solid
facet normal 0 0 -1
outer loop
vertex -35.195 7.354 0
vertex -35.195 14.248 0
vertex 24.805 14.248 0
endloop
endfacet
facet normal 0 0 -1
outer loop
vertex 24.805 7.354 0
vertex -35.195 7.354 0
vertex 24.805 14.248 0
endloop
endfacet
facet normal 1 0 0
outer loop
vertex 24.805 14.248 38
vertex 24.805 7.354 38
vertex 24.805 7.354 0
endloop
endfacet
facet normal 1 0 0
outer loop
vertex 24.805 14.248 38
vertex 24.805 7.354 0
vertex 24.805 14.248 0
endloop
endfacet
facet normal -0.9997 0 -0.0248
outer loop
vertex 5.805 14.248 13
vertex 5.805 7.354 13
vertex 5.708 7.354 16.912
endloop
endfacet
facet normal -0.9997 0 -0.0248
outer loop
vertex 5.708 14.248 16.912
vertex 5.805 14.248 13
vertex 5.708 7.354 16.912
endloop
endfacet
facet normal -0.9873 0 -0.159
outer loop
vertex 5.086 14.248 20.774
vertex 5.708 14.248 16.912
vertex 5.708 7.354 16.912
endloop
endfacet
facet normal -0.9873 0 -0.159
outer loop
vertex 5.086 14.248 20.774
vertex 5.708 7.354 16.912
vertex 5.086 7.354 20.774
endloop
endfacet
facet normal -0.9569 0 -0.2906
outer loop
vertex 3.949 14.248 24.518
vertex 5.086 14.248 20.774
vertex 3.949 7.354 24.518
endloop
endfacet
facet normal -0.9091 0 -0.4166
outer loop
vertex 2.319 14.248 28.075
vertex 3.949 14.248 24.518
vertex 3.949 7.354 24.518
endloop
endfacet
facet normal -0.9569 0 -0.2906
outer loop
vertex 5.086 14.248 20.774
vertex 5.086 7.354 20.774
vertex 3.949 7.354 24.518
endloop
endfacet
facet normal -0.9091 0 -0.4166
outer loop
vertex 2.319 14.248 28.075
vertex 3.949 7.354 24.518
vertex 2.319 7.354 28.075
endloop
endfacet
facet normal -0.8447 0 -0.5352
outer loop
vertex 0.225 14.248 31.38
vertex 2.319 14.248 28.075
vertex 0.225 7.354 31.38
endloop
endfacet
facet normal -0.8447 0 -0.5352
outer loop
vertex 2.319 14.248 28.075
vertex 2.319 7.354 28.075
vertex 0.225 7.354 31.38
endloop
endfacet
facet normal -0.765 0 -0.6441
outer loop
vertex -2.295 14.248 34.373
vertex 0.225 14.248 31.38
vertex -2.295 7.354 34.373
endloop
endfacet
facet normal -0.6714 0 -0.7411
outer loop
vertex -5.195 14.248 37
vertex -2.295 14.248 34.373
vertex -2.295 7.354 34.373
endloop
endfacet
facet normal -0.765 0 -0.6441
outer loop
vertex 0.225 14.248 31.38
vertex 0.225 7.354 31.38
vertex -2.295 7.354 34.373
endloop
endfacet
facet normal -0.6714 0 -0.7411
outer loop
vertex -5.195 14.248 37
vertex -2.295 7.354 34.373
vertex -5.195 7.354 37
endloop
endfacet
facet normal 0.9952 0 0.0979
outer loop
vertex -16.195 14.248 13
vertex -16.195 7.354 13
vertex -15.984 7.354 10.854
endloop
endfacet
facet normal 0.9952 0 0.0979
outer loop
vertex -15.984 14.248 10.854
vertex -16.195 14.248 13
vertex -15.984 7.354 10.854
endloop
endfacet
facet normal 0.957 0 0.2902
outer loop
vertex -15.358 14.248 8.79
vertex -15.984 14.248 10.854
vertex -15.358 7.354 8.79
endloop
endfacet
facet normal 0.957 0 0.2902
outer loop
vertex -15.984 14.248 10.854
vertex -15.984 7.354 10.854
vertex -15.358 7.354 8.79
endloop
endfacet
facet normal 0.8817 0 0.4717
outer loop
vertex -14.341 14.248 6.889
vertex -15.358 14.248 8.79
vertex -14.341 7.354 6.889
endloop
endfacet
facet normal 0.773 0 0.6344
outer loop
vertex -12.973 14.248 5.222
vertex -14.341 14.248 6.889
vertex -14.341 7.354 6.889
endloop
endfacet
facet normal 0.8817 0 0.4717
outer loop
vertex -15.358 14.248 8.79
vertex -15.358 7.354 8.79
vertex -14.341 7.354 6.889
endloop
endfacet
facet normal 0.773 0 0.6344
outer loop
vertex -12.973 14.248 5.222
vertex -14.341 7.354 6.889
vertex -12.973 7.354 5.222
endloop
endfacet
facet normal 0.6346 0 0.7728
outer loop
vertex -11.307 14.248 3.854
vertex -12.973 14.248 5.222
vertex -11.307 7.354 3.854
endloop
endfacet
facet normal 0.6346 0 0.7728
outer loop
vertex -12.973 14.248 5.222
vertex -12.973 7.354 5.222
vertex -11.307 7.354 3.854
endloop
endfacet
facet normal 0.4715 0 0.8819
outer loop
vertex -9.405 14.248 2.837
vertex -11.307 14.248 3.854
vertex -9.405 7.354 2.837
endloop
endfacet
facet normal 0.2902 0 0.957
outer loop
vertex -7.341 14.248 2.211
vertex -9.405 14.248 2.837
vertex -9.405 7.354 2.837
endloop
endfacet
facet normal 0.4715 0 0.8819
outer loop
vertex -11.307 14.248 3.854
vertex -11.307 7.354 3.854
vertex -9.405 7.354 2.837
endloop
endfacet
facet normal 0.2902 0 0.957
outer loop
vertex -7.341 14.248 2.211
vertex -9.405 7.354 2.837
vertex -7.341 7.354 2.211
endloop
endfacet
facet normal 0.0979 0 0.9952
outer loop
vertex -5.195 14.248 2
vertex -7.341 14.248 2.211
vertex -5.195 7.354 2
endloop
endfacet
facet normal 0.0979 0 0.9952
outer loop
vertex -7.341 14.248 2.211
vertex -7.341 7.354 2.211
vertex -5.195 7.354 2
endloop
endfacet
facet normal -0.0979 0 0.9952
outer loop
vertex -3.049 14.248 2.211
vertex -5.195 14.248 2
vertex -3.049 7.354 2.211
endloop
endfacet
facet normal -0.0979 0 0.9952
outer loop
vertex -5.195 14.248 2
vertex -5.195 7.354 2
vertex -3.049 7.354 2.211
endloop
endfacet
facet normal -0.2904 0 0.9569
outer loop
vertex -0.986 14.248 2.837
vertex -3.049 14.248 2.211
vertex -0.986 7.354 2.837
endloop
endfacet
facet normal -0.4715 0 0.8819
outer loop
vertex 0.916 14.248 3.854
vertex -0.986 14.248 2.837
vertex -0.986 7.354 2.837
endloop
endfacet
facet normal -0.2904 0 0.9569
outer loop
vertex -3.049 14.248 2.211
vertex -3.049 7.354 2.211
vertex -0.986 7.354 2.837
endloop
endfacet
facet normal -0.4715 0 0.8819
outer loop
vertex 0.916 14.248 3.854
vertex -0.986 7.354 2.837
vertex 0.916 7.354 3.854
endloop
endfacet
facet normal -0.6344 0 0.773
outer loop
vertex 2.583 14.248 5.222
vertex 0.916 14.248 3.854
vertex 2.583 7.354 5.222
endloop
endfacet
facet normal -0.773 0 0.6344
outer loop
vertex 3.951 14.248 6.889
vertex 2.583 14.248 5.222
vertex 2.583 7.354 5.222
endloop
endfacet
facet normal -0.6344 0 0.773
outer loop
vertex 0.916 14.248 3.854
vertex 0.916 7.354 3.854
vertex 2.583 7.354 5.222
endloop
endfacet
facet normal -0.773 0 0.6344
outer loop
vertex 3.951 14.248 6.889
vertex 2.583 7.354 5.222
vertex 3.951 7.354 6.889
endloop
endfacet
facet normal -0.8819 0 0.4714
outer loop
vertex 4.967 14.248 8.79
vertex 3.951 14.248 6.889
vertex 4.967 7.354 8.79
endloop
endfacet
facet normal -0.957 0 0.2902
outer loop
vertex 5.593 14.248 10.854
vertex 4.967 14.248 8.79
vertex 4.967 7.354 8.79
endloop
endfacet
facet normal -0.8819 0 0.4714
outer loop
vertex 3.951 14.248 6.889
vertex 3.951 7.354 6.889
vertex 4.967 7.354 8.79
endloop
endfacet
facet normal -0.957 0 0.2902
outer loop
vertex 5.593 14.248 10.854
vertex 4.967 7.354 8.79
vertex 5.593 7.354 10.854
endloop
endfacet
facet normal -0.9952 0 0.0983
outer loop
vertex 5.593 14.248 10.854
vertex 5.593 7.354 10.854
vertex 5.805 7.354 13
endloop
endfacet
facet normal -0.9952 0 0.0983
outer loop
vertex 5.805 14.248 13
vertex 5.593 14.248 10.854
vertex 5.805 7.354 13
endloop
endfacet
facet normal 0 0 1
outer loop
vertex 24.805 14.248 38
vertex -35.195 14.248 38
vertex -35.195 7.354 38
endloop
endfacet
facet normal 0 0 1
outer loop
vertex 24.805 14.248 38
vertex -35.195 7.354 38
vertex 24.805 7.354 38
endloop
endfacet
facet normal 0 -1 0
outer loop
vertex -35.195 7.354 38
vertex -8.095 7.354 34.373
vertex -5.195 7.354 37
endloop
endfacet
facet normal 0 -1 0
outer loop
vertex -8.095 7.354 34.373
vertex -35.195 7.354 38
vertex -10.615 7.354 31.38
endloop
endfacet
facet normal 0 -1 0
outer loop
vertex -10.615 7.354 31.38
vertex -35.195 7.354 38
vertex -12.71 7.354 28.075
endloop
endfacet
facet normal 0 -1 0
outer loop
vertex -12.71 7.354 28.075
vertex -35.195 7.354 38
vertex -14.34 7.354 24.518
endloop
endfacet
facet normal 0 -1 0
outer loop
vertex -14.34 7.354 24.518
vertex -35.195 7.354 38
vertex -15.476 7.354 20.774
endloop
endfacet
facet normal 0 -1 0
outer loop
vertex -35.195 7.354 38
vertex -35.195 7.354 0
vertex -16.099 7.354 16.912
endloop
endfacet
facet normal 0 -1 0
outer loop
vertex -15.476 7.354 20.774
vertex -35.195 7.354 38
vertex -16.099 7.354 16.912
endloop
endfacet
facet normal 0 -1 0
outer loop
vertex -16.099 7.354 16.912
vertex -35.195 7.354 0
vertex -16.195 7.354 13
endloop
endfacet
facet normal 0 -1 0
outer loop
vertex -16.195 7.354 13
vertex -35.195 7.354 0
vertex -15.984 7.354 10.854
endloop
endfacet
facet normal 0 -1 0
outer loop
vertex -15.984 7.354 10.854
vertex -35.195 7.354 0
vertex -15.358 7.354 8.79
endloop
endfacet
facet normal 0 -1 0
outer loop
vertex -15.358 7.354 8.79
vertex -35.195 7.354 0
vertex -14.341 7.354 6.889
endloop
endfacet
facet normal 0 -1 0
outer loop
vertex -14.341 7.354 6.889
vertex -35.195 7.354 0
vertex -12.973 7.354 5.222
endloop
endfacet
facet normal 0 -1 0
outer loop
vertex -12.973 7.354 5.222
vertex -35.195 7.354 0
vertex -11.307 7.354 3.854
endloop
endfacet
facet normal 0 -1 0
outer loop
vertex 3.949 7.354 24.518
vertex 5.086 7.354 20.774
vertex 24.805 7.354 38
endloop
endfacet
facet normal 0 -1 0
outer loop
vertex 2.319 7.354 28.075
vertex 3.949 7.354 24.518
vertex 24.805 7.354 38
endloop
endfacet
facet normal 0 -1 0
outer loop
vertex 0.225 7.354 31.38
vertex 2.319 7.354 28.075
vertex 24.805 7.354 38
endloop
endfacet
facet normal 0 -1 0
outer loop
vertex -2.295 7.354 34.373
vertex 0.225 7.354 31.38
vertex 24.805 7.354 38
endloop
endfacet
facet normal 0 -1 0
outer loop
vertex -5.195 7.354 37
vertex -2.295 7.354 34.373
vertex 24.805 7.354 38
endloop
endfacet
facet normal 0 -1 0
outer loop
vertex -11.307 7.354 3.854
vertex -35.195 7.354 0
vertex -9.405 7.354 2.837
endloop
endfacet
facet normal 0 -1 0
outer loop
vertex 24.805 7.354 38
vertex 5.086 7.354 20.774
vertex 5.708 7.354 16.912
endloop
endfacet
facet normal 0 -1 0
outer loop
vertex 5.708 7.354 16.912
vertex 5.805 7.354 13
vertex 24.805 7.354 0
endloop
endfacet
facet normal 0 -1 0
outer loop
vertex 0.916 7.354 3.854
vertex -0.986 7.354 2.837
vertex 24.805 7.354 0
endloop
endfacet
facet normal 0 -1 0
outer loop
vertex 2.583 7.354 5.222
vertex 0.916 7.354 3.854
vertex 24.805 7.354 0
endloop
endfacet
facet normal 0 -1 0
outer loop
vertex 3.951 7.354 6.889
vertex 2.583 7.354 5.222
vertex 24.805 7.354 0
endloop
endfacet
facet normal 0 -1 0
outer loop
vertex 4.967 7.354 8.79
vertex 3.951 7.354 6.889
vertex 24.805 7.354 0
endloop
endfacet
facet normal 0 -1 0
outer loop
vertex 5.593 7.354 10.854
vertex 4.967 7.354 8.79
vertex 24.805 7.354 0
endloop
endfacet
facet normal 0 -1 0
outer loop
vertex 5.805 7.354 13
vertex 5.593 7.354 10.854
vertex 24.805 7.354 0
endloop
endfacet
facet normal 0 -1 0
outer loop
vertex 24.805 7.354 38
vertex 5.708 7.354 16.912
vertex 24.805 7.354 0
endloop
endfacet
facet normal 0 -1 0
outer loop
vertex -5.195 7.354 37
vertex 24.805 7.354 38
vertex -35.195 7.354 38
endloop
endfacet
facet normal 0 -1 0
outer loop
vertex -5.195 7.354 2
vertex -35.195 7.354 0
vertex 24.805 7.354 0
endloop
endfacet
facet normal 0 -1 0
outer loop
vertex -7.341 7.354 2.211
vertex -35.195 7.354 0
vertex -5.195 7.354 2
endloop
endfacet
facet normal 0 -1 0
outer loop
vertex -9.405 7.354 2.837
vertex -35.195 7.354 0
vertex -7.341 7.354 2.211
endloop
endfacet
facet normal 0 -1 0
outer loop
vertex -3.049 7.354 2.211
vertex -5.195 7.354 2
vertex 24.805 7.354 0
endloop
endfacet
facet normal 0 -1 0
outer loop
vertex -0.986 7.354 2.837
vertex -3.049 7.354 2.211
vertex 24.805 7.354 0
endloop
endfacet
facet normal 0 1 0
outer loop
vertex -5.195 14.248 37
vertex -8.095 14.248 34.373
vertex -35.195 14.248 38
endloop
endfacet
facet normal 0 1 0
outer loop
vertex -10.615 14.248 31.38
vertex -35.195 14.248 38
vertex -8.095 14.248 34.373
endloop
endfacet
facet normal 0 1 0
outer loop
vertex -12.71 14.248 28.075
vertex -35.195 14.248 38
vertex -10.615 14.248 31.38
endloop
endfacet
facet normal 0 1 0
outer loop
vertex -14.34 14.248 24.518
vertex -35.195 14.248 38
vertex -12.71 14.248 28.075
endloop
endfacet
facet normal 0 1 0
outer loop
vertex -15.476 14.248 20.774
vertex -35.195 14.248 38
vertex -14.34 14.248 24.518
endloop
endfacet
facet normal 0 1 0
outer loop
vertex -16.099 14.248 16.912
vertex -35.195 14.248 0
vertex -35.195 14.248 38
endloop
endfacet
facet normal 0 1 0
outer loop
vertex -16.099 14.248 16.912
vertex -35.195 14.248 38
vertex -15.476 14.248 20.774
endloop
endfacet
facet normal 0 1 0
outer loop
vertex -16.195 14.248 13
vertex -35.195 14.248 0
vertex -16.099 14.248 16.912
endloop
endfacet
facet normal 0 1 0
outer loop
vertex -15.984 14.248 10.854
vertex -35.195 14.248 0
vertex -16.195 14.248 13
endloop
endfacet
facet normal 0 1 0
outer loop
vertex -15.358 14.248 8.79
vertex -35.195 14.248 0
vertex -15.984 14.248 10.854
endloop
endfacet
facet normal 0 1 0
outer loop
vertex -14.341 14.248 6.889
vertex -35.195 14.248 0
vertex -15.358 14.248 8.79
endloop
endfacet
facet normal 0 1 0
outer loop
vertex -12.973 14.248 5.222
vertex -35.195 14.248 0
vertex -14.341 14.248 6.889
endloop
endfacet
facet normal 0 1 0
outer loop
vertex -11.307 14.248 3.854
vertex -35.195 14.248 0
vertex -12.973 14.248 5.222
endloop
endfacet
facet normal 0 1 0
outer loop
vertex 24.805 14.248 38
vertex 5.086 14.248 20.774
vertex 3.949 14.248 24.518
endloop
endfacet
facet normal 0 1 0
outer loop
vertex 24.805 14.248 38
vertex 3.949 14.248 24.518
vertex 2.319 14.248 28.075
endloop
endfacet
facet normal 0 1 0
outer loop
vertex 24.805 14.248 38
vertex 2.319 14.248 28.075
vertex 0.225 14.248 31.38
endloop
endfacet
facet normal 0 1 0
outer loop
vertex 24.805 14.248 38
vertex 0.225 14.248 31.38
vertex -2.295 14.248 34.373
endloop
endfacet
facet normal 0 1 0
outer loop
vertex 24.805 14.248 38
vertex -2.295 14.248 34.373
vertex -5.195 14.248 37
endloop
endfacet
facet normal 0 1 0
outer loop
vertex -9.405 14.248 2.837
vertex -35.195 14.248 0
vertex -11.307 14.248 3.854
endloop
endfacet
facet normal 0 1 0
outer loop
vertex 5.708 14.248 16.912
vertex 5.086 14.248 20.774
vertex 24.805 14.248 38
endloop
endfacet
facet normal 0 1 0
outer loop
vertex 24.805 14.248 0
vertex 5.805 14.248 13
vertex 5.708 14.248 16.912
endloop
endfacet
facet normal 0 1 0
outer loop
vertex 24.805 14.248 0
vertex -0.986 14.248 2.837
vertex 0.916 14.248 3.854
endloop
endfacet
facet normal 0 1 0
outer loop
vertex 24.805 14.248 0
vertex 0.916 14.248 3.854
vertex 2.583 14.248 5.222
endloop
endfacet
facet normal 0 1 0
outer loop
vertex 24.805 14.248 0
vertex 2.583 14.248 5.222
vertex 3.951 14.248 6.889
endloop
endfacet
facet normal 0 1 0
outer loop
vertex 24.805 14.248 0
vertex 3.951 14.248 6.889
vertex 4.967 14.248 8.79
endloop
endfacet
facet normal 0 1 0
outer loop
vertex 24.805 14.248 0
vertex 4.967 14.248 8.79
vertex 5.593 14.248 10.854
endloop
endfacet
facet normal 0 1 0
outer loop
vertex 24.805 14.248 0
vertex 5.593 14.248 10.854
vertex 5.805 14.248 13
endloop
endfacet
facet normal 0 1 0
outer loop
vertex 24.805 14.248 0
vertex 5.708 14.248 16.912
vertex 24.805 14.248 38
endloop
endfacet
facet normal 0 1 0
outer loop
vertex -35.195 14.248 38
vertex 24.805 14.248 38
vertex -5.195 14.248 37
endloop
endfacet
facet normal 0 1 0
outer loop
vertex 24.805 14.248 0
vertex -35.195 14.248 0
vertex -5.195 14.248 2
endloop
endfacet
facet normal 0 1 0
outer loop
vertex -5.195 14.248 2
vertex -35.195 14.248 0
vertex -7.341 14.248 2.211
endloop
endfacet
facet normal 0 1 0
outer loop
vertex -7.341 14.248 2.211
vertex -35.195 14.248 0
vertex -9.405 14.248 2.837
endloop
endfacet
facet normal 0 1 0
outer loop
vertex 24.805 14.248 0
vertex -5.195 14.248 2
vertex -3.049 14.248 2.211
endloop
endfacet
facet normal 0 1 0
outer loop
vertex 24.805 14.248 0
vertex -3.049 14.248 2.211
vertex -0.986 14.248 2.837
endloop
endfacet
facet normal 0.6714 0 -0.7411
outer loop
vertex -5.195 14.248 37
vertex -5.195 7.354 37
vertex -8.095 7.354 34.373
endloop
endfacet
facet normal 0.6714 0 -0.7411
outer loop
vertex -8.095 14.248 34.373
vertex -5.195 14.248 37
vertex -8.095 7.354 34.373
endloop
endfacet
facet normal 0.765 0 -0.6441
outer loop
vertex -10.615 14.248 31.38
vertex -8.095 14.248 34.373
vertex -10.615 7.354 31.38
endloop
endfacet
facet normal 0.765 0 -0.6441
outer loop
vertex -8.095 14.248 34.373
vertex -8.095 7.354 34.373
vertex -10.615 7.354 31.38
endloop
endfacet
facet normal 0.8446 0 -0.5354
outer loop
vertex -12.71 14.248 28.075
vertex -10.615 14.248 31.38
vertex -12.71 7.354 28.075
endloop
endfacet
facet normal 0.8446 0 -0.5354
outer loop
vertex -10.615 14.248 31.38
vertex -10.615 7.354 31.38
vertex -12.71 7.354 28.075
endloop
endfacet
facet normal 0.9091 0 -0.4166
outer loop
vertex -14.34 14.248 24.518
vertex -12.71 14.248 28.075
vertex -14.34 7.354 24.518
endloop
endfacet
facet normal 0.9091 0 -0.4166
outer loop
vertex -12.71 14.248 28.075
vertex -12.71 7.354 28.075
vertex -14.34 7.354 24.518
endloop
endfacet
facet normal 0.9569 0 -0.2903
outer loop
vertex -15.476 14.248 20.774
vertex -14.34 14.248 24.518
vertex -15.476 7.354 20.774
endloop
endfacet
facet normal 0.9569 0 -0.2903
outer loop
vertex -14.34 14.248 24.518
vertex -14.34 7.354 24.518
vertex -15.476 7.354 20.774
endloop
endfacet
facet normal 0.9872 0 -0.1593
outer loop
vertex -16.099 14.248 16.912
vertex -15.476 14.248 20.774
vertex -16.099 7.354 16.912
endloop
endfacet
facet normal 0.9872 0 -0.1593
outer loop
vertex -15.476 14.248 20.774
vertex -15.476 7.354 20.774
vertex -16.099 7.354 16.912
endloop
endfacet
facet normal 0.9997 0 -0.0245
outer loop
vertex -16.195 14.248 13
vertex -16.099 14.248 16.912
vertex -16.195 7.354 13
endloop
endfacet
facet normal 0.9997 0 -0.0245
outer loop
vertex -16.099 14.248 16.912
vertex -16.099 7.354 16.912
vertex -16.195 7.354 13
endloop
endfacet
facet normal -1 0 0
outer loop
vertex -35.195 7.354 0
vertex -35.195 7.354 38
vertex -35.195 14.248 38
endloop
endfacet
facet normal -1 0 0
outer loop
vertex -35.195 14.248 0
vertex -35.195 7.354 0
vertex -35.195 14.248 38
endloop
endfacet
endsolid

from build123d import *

# Parameters (mm, degrees)
F0_W     = 60
F0_H     = 6.8944109904
F1_DEPTH = 38
F3_DEPTH = 25


with BuildPart() as f1:
    # F0 (on Top) → F1 (new body)
    with BuildSketch(Plane.XY):
        with Locations((-5.1953140646, 10.8007821254)):
            Rectangle(F0_W, F0_H)
    extrude(amount=F1_DEPTH)

    # F2 (on face) → F3 (cut)
    with BuildSketch(Plane.XZ.offset(-7.3535766302)):
        with BuildLine():
            ThreePointArc((-5.1953140646, 37), (-13.5847741794, 26.3243358859), (-16.1953140646, 13))
            ThreePointArc((-16.1953140646, 13), (-5.1953140646, 2), (5.8046859354, 13))
            ThreePointArc((5.8046859354, 13), (3.1941460502, 26.3243358859), (-5.1953140646, 37))
        make_face()
    extrude(amount=-F3_DEPTH, mode=Mode.SUBTRACT)


solid = f1.part
